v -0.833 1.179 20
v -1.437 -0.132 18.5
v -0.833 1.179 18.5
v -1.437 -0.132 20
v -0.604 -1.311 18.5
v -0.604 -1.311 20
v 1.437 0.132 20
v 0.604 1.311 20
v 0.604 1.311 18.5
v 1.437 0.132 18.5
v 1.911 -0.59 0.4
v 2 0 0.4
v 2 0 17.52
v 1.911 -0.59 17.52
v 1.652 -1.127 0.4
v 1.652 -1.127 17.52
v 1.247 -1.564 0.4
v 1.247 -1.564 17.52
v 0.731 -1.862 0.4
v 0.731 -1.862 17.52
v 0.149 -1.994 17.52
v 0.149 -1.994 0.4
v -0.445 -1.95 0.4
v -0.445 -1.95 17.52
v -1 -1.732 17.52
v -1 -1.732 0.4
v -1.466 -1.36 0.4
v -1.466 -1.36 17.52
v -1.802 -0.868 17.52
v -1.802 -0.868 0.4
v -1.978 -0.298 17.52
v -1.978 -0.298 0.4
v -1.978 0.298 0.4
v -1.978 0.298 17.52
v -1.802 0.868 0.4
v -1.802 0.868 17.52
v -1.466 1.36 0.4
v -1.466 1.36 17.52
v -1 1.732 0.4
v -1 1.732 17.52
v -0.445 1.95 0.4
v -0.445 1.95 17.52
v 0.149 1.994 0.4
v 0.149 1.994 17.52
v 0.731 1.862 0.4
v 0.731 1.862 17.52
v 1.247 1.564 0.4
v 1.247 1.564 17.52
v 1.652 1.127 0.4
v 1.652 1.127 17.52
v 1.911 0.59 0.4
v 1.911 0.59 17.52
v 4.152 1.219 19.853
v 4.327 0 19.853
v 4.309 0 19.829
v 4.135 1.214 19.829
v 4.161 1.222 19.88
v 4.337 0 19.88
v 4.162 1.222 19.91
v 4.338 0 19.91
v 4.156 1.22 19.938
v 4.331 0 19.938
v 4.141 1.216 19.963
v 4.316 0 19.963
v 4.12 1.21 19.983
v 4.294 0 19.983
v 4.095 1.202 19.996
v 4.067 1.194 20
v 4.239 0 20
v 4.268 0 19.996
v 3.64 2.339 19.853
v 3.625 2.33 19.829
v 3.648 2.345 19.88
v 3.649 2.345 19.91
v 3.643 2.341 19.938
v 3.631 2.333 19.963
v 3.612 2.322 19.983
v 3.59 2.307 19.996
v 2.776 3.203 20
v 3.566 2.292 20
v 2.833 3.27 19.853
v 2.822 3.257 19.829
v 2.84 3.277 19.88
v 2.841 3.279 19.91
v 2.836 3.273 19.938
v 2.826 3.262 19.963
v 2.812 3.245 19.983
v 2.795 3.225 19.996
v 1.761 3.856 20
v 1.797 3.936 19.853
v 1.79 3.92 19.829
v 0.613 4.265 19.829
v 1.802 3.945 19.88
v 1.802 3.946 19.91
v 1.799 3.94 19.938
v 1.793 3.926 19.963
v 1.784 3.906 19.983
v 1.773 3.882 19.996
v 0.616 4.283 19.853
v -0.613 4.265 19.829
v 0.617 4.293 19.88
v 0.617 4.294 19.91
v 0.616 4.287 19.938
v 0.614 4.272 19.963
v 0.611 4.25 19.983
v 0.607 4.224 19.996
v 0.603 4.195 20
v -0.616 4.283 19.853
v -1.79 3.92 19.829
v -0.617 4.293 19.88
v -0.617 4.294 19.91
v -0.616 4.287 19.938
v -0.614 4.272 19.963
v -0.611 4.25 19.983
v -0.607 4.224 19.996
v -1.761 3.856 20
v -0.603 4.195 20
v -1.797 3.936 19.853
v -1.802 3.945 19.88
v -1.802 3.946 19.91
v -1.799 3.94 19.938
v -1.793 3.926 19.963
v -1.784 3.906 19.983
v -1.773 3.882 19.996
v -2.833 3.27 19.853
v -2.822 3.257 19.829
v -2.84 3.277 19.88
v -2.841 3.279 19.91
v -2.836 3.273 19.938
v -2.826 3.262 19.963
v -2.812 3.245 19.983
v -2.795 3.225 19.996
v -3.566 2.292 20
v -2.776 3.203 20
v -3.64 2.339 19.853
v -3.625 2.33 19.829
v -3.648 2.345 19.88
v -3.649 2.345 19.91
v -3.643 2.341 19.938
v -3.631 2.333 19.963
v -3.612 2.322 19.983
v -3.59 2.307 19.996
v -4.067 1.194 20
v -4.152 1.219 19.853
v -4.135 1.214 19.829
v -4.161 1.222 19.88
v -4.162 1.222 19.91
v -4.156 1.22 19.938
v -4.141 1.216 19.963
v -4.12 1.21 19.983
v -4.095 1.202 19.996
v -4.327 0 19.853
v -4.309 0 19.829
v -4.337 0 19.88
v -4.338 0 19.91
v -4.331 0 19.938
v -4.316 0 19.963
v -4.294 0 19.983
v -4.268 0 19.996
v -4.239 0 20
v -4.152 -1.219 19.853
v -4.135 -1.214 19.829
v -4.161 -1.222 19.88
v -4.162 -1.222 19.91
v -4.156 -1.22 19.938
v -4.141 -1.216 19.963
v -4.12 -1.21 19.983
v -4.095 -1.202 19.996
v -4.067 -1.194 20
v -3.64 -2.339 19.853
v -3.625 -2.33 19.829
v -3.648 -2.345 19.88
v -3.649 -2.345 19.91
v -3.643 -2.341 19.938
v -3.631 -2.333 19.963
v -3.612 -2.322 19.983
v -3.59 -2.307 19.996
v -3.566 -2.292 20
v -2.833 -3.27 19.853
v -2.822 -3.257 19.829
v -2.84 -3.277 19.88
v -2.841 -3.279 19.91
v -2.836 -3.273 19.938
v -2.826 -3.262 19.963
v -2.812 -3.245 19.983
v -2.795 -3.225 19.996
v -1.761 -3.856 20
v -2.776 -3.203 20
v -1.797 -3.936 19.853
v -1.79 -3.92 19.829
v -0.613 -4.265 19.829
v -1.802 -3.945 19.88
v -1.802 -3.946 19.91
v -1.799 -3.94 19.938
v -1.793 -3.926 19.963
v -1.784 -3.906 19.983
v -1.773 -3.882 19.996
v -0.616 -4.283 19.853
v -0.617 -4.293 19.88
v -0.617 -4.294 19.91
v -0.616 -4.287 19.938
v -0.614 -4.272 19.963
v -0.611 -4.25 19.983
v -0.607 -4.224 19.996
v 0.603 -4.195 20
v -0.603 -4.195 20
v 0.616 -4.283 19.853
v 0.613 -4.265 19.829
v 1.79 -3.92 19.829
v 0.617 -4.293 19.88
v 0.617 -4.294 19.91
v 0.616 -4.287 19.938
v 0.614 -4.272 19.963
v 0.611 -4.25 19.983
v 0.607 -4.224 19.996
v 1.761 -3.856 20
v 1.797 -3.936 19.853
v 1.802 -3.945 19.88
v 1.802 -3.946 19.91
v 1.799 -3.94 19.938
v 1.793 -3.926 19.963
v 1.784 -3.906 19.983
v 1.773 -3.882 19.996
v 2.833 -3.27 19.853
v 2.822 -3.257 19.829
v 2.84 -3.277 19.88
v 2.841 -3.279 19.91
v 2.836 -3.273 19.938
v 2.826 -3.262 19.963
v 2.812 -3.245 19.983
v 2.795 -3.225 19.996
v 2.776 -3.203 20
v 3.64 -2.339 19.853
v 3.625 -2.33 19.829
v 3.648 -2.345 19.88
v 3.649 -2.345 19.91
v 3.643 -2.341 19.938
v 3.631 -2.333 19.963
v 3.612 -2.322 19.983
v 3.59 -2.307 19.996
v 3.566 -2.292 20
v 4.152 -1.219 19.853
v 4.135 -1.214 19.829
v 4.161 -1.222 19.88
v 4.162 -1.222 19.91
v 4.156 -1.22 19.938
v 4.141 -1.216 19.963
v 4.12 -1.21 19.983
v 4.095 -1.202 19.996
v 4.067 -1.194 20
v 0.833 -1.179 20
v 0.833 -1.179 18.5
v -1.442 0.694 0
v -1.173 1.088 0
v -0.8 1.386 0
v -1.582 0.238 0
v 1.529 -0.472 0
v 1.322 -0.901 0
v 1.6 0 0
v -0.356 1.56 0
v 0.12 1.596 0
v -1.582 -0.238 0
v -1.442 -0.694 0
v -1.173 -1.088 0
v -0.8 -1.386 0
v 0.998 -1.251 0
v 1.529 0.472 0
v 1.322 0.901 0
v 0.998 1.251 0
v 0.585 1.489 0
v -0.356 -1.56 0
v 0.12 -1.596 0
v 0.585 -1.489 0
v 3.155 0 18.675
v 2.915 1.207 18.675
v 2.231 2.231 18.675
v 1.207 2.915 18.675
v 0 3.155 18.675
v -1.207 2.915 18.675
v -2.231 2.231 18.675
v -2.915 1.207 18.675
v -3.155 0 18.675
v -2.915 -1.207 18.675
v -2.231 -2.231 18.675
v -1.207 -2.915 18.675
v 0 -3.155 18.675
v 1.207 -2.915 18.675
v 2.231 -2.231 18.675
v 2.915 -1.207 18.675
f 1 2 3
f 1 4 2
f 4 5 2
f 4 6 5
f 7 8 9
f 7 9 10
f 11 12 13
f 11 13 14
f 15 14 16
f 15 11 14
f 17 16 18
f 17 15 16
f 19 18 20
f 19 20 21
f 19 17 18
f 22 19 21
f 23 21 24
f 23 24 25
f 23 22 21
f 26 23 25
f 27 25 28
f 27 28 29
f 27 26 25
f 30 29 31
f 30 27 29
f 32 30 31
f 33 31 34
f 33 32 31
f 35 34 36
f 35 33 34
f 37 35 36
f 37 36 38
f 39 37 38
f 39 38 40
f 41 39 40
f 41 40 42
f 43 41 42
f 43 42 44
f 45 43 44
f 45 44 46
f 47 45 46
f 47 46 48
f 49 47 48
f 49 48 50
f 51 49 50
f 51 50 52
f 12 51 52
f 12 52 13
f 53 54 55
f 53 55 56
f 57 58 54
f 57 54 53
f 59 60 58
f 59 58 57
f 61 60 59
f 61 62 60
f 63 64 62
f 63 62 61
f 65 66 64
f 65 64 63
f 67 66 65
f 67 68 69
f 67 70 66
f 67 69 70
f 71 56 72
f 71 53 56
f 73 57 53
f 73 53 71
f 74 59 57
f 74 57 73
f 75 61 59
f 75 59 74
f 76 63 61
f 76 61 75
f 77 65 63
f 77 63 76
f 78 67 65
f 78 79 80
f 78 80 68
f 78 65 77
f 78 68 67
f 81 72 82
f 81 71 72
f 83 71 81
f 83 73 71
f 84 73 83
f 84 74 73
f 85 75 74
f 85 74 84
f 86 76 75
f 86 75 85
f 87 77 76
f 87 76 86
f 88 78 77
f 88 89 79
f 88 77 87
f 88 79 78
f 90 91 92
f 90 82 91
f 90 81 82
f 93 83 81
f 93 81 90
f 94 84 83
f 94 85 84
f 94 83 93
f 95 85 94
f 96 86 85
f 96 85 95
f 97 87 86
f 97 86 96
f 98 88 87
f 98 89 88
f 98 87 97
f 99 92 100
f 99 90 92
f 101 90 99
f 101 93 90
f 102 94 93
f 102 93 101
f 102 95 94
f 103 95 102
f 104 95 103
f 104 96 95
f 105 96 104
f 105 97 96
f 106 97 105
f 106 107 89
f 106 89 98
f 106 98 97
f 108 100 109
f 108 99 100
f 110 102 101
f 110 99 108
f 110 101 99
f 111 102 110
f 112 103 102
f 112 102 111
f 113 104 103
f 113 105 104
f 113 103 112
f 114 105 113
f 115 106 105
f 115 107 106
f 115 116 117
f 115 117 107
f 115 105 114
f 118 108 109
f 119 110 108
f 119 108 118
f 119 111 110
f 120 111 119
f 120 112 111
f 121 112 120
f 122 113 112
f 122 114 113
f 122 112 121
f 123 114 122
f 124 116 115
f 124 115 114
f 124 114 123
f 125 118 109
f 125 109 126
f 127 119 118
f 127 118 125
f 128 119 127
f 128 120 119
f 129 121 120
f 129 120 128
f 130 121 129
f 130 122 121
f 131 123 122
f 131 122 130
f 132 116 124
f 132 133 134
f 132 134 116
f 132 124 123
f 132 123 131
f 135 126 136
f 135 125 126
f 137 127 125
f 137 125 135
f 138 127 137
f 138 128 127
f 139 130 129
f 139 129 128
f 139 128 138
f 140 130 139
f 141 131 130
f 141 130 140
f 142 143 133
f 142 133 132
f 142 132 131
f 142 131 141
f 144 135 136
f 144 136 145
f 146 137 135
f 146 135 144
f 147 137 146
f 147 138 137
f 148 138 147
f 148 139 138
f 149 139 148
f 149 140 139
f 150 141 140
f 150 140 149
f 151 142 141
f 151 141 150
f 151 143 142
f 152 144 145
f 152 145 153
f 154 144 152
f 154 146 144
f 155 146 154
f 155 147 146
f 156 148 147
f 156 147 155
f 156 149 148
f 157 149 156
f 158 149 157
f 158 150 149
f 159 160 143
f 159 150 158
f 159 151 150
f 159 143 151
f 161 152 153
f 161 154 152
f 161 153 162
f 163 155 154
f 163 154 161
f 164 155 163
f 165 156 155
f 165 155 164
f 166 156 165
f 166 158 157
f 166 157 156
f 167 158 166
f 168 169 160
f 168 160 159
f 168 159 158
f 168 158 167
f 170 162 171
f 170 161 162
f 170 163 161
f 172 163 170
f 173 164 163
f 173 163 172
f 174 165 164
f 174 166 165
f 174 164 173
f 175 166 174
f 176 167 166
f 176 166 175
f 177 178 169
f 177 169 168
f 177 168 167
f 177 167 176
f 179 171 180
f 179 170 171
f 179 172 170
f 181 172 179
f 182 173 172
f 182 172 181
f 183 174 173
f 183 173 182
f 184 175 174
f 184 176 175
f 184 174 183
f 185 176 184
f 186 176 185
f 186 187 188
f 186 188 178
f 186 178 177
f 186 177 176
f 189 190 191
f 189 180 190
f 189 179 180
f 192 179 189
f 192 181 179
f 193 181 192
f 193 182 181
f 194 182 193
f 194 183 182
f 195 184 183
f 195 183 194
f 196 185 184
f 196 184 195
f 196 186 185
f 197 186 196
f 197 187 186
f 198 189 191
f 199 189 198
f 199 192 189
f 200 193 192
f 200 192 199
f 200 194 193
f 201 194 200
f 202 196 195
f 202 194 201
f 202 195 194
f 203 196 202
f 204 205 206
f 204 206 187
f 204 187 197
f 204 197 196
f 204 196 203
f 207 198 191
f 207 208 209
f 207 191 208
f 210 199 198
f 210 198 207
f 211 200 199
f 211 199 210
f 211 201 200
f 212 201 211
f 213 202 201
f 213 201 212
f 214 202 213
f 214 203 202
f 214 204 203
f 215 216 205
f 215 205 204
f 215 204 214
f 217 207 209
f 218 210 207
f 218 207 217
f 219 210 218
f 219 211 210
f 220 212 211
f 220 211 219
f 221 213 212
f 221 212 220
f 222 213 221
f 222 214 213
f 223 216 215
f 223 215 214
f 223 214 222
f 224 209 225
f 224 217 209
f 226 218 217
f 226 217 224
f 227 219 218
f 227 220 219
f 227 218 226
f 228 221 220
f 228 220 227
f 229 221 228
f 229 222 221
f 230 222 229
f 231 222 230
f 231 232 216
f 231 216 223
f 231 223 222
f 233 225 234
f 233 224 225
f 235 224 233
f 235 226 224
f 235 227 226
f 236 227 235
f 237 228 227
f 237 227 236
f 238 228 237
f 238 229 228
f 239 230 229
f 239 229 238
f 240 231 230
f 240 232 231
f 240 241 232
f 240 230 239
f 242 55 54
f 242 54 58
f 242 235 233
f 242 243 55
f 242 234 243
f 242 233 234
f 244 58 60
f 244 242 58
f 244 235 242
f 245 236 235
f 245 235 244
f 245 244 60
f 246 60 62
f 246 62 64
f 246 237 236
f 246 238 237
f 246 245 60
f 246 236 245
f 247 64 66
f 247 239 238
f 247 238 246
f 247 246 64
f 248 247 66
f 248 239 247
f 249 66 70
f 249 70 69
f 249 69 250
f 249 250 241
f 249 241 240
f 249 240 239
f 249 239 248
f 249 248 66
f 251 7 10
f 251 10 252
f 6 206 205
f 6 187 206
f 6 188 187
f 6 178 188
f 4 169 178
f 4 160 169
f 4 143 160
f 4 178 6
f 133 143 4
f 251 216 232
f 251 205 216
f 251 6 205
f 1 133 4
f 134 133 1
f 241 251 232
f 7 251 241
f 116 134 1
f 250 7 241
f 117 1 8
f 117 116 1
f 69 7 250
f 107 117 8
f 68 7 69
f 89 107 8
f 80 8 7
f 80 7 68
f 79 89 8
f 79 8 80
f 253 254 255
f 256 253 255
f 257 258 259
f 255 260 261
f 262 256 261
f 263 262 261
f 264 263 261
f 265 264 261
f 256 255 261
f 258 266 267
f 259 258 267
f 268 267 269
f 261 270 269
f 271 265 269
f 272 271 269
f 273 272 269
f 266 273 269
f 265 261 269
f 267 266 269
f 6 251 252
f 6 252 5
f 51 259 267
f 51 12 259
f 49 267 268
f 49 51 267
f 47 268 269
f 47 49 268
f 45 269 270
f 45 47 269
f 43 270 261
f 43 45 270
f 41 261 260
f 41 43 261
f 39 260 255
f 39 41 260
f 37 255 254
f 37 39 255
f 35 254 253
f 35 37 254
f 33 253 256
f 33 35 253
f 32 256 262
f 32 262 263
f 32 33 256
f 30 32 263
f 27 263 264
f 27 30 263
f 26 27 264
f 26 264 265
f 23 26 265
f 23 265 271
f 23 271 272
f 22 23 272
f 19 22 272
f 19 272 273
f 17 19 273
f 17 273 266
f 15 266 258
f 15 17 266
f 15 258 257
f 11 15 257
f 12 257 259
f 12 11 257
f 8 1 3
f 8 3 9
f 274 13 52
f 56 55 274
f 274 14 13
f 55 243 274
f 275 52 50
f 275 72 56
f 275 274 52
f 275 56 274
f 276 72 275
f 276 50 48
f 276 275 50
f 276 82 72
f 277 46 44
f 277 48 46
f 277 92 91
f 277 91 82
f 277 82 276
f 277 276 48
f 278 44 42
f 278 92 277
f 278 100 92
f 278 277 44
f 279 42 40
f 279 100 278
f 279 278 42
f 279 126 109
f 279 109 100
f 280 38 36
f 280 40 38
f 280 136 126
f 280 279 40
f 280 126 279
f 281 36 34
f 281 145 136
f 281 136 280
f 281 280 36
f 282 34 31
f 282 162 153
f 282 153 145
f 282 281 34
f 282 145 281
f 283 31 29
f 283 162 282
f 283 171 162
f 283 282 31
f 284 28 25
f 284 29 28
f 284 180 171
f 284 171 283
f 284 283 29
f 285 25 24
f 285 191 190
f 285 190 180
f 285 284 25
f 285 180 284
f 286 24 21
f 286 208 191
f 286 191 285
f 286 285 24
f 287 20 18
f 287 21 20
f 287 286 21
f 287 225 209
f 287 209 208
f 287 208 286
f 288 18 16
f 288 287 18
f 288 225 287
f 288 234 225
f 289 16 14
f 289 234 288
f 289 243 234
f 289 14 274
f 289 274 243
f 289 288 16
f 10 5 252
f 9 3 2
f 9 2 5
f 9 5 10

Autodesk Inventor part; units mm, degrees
ref_plane "YZ Plane" through (0, 0, 0) normal (1, 0, 0) x (0, 1, 0)
ref_plane "XZ Plane" through (0, 0, 0) normal (0, 1, 0) x (-1, 0, 0)
ref_plane "XY Plane" through (0, 0, 0) normal (0, 0, 1) x (1, 0, 0)
sketch "Sketch1" plane through (0, 0, 0) normal (0, 0, 1) x (1, 0, 0)
  circle A0 centre (0, 0) radius 2
  dimension "Diameter" = 4
extrude "Extrusion1" add sketch "Sketch1" along normal blind 17.52
sketch "Sketch2" plane through (0, 0, 17.52) normal (0, 0, 1) x (1, 0, 0)
  circle A0 centre (0, 0) radius 2 projected
extrude "Extrusion2" add sketch "Sketch2" along normal blind 2.48 draft 45
sketch "Sketch3" plane through (0, 0, 20) normal (0, 0, 1) x (1, 0, 0)
  circle A0 centre (0, 0) radius 4.48 projected
  circle A1 centre (0, 0) radius 1.4434 construction
  line L0 (0.6042, 1.3108) -> (1.4373, 0.1322)
  line L1 (1.4373, 0.1322) -> (0.8331, -1.1787)
  line L2 (0.8331, -1.1787) -> (-0.6042, -1.3108)
  line L3 (-0.6042, -1.3108) -> (-1.4373, -0.1322)
  line L4 (-1.4373, -0.1322) -> (-0.8331, 1.1787)
  line L5 (-0.8331, 1.1787) -> (0.6042, 1.3108)
  dimension "Hex_Width" = 2.5
extrude "Extrusion3" cut sketch "Sketch3" against normal blind 1.5 contours L0 L1 L2 L3 L4 L5
thread "Thread1" size "M4x0.7" class "4g6g" standard "ANSI Metric M Profile" length 17.52
chamfer "Chamfer2" distance 0.4 angle 45 1 edges at (-2, 0, 0)
fillet "Fillet1" radius 0.1 1 edges at (-4.48, 0, 20)
equation "\"d13\" = Chamfer"
equation "\"Thread_Length\" = 7.52"
equation "\"Chamfer\" = 0.4"
properties part number "SCREW, FLAT HD, P, 12_9, M4X0_7X20"
